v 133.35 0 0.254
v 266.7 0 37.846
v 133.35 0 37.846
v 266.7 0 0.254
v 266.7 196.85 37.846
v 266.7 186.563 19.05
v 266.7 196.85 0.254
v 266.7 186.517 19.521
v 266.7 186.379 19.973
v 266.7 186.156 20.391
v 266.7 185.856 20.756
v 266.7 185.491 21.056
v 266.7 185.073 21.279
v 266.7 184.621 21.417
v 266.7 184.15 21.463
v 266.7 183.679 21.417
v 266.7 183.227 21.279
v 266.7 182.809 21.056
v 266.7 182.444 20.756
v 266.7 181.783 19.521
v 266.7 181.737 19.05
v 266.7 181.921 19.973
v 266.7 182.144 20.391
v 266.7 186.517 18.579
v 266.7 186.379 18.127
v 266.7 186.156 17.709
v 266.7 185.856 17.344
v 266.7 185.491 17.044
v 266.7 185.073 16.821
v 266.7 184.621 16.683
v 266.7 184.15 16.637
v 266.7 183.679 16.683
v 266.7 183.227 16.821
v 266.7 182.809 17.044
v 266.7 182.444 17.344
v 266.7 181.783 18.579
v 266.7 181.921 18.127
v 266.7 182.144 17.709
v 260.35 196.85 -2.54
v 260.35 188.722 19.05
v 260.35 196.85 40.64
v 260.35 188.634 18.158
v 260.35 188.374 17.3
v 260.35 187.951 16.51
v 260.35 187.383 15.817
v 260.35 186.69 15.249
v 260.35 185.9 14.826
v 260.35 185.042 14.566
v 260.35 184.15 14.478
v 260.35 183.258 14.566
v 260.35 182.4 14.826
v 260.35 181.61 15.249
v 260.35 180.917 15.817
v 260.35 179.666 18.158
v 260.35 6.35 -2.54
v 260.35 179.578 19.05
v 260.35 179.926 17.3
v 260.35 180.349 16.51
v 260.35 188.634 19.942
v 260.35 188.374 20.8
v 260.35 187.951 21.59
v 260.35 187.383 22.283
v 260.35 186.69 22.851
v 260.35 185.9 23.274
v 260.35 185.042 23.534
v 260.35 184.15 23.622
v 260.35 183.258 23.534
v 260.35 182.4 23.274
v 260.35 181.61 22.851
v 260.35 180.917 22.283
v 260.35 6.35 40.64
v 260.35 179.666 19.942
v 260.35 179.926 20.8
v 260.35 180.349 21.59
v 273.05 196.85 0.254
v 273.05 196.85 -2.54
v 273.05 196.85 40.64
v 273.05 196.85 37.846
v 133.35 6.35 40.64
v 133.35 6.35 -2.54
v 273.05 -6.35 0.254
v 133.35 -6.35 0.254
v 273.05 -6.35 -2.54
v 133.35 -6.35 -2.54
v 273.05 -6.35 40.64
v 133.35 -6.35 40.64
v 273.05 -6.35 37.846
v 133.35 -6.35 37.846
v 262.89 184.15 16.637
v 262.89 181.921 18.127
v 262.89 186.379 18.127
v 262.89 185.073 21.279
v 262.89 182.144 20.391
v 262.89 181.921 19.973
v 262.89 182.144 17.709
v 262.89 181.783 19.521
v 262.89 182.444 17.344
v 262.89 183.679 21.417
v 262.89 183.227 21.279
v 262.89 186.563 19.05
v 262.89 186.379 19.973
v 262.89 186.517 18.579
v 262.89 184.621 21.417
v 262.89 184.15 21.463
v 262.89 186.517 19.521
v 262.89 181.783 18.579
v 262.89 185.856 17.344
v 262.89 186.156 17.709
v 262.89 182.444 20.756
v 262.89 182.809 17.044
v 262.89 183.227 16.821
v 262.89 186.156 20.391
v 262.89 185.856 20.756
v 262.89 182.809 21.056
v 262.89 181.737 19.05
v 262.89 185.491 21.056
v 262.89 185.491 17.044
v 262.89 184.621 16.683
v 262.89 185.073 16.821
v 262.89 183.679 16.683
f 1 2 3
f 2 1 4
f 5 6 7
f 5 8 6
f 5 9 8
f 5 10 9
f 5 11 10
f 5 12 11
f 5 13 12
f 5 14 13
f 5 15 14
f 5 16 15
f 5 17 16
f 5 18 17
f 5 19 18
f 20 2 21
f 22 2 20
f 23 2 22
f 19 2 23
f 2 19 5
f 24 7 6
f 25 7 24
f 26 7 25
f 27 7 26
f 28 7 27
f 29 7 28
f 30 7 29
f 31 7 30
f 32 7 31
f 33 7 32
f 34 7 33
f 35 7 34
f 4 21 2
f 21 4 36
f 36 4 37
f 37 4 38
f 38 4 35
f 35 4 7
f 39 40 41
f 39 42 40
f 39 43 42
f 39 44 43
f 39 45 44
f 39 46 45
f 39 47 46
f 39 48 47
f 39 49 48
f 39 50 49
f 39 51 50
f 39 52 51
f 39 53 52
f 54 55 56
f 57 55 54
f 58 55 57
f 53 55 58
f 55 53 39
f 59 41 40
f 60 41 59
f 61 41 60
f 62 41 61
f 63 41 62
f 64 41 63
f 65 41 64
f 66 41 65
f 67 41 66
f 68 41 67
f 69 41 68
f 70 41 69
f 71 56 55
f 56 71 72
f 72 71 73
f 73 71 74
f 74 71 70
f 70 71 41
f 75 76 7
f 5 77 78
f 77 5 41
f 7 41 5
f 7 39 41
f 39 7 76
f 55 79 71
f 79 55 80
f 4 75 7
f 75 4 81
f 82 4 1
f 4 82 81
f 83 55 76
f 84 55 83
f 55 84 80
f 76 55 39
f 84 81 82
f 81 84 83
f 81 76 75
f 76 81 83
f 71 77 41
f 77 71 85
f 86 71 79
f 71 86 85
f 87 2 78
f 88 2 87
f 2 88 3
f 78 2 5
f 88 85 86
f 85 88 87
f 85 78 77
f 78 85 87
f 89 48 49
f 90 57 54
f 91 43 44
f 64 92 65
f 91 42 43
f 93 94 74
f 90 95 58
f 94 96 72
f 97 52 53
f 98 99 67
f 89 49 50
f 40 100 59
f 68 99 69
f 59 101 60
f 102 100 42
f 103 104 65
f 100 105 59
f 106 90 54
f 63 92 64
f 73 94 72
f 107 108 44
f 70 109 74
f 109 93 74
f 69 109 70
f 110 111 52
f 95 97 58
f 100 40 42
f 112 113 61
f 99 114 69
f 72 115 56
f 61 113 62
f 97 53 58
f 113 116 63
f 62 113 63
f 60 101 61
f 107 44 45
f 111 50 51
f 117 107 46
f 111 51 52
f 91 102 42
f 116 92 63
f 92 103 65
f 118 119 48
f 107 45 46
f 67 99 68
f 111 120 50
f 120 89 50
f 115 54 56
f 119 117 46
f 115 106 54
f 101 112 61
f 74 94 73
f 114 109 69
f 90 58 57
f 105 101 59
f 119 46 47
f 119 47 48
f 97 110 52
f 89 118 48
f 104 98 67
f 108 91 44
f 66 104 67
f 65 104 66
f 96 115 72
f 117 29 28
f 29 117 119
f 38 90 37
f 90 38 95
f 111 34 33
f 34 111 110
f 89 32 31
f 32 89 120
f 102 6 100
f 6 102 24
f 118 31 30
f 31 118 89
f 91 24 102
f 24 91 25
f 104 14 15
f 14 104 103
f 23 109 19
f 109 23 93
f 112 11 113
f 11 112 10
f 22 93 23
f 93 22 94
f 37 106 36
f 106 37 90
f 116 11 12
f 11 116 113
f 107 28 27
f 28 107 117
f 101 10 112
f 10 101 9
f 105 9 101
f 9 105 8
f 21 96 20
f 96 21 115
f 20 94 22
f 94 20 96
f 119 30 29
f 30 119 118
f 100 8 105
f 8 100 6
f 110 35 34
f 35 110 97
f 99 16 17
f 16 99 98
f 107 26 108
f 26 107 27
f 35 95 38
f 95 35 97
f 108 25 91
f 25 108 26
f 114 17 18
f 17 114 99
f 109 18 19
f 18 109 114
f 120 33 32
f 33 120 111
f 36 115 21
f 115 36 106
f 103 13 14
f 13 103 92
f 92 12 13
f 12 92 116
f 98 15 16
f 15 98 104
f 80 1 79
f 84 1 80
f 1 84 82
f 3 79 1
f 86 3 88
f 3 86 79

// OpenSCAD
// file: _cat_door_u_liner_lib.scad
// Cat door U-shaped liner - shared geometry.
// Fits into a rectangular box cut into a door, lining the bottom and
// two sides with a thin wall so a smaller insert seats snugly in the gap.
// Top of the U is left open.
//
// Flanges at the front and/or back cap the ends, sitting flush against
// the door's face and overlapping the cut edge to hide it.
//
// The full part (10.5in wide) is too wide for a 256mm printer bed, so it's
// split down the middle of the bottom rail into two L-shaped halves - see
// cat_door_u_liner_left.scad / cat_door_u_liner_right.scad, which include
// this file and call render_liner(). This file has no directly renderable
// geometry of its own (build_stl.py skips files starting with "_").

// ---- Parameters (inches) ----
door_depth      = 1.5;   // door thickness (liner spans this, Z)
box_width       = 10.5;  // width of the cutout in the door (X)
box_height      = 7.75;  // height of the cutout in the door (Y)
wall            = 0.25;  // thickness of the liner material (the gap it fills)

flange_front    = true;  // add a flange on the front face
flange_back     = true;  // add a flange on the back face
flange_overlap  = 0.25;  // how far the flange extends past the cut edge
flange_thick    = 0.1;   // flange thickness (Z), kept small/low-profile

screw_holes     = true;  // add mounting screw holes through the two legs
screw_hole_dia  = 0.19;  // clearance diameter for the screw shank (~#8 screw)
screw_hole_inset = 0.5;  // distance in from the tip (open end) of each leg

countersink       = true; // recess for a flat/flush screw head, on the inner face
countersink_dia   = 0.36; // head diameter (~#8 flat-head screw)
countersink_depth = 0.1;  // how deep the taper cuts into the leg (< wall)

split_x = box_width / 2; // where to cut the bottom rail into two halves
                          // (centered; well clear of the screw holes near
                          // each leg, so the cut doesn't hit any hardware)

eps = 0.01; // small overlap so flange and liner fuse into one solid
big = 1000; // far outside the model, used to build clipping half-spaces

// ---- Model ----
// U shape: two side rectangles + one bottom rectangle, open at the top.
// w/h are the outer footprint, wall_thick the leg width, spanning z0..z1,
// shifted by (x_off, y_off) so a flange can grow outward from the liner.
module u_shape(w, h, wall_thick, z0, z1, x_off = 0, y_off = 0) {
    zt = z1 - z0;
    translate([x_off, y_off, z0]) {
        cube([wall_thick, h, zt]);                       // left side
        translate([w - wall_thick, 0, 0])
            cube([wall_thick, h, zt]);                    // right side
        cube([w, wall_thick, zt]);                        // bottom
    }
}

// Horizontal screw hole through one leg only (not the flange), so a screw
// bites into the solid door beside the cutout. Bored outward through the
// leg's outer face (x_start), centered on the leg's depth (Z), clear of
// the flanges which only occupy the ends of the Z range.
module screw_hole_leg(x_start, y_pos) {
    translate([x_start - eps, y_pos, door_depth / 2])
        rotate([0, 90, 0])
            cylinder(h = wall + 2 * eps, d = screw_hole_dia, $fn = 32);
}

// Countersink taper on the inner face (box-interior side) of a leg, where
// the screw head seats. dir = -1 for the left leg (inner face is the leg's
// high-x side, cone narrows toward -x); dir = +1 for the right leg (inner
// face is the low-x side, cone narrows toward +x).
module countersink_leg(x_face, y_pos, dir) {
    d1 = (dir < 0) ? screw_hole_dia : countersink_dia;
    d2 = (dir < 0) ? countersink_dia : screw_hole_dia;
    x0 = (dir < 0) ? x_face - countersink_depth : x_face;
    translate([x0, y_pos, door_depth / 2])
        rotate([0, 90, 0])
            cylinder(h = countersink_depth, d1 = d1, d2 = d2, $fn = 32);
}

module cat_door_liner() {
    difference() {
        union() {
            // Main liner, filling the through-hole depth
            u_shape(box_width, box_height, wall, 0, door_depth);

            // Front flange: sits in front of the door face (z < 0), wider
            // than the hole so it overlaps and hides the cut on 3 sides
            if (flange_front)
                u_shape(box_width + 2 * flange_overlap, box_height + flange_overlap,
                        wall + flange_overlap, -flange_thick, eps,
                        -flange_overlap, -flange_overlap);

            // Back flange: mirrors the front, behind the door face
            if (flange_back)
                u_shape(box_width + 2 * flange_overlap, box_height + flange_overlap,
                        wall + flange_overlap, door_depth - eps, door_depth + flange_thick,
                        -flange_overlap, -flange_overlap);
        }

        if (screw_holes) {
            y_pos = box_height - screw_hole_inset;
            screw_hole_leg(0, y_pos);                 // left leg, out through x=0
            screw_hole_leg(box_width - wall, y_pos);  // right leg, out through x=box_width

            if (countersink) {
                countersink_leg(wall, y_pos, -1);            // left leg, inner face
                countersink_leg(box_width - wall, y_pos, 1); // right leg, inner face
            }
        }
    }
}

// Keeps only the x <= split_x (or x >= split_x) portion of the liner, for
// printing as two separate pieces that join at the middle of the bottom rail.
module cat_door_liner_part(part) {
    if (part == "left")
        intersection() {
            cat_door_liner();
            translate([-big, -big, -big]) cube([big + split_x, 2 * big, 2 * big]);
        }
    else if (part == "right")
        intersection() {
            cat_door_liner();
            translate([split_x, -big, -big]) cube([big + (box_width - split_x), 2 * big, 2 * big]);
        }
    else
        cat_door_liner();
}

// All dimensions above are in inches; STL files carry no unit, and slicers
// (Elegoo/Cura/PrusaSlicer/etc.) assume mm, so scale the output to mm here
// to keep the real-world size correct on import.
module render_liner(part = "whole") {
    mm_per_inch = 25.4;
    scale([mm_per_inch, mm_per_inch, mm_per_inch])
        cat_door_liner_part(part);
}
// main file
// Right half of the cat door U liner (fits a 256mm bed). See
// _cat_door_u_liner_lib.scad for parameters and the left half.
include <_cat_door_u_liner_lib.scad>
render_liner("right");
